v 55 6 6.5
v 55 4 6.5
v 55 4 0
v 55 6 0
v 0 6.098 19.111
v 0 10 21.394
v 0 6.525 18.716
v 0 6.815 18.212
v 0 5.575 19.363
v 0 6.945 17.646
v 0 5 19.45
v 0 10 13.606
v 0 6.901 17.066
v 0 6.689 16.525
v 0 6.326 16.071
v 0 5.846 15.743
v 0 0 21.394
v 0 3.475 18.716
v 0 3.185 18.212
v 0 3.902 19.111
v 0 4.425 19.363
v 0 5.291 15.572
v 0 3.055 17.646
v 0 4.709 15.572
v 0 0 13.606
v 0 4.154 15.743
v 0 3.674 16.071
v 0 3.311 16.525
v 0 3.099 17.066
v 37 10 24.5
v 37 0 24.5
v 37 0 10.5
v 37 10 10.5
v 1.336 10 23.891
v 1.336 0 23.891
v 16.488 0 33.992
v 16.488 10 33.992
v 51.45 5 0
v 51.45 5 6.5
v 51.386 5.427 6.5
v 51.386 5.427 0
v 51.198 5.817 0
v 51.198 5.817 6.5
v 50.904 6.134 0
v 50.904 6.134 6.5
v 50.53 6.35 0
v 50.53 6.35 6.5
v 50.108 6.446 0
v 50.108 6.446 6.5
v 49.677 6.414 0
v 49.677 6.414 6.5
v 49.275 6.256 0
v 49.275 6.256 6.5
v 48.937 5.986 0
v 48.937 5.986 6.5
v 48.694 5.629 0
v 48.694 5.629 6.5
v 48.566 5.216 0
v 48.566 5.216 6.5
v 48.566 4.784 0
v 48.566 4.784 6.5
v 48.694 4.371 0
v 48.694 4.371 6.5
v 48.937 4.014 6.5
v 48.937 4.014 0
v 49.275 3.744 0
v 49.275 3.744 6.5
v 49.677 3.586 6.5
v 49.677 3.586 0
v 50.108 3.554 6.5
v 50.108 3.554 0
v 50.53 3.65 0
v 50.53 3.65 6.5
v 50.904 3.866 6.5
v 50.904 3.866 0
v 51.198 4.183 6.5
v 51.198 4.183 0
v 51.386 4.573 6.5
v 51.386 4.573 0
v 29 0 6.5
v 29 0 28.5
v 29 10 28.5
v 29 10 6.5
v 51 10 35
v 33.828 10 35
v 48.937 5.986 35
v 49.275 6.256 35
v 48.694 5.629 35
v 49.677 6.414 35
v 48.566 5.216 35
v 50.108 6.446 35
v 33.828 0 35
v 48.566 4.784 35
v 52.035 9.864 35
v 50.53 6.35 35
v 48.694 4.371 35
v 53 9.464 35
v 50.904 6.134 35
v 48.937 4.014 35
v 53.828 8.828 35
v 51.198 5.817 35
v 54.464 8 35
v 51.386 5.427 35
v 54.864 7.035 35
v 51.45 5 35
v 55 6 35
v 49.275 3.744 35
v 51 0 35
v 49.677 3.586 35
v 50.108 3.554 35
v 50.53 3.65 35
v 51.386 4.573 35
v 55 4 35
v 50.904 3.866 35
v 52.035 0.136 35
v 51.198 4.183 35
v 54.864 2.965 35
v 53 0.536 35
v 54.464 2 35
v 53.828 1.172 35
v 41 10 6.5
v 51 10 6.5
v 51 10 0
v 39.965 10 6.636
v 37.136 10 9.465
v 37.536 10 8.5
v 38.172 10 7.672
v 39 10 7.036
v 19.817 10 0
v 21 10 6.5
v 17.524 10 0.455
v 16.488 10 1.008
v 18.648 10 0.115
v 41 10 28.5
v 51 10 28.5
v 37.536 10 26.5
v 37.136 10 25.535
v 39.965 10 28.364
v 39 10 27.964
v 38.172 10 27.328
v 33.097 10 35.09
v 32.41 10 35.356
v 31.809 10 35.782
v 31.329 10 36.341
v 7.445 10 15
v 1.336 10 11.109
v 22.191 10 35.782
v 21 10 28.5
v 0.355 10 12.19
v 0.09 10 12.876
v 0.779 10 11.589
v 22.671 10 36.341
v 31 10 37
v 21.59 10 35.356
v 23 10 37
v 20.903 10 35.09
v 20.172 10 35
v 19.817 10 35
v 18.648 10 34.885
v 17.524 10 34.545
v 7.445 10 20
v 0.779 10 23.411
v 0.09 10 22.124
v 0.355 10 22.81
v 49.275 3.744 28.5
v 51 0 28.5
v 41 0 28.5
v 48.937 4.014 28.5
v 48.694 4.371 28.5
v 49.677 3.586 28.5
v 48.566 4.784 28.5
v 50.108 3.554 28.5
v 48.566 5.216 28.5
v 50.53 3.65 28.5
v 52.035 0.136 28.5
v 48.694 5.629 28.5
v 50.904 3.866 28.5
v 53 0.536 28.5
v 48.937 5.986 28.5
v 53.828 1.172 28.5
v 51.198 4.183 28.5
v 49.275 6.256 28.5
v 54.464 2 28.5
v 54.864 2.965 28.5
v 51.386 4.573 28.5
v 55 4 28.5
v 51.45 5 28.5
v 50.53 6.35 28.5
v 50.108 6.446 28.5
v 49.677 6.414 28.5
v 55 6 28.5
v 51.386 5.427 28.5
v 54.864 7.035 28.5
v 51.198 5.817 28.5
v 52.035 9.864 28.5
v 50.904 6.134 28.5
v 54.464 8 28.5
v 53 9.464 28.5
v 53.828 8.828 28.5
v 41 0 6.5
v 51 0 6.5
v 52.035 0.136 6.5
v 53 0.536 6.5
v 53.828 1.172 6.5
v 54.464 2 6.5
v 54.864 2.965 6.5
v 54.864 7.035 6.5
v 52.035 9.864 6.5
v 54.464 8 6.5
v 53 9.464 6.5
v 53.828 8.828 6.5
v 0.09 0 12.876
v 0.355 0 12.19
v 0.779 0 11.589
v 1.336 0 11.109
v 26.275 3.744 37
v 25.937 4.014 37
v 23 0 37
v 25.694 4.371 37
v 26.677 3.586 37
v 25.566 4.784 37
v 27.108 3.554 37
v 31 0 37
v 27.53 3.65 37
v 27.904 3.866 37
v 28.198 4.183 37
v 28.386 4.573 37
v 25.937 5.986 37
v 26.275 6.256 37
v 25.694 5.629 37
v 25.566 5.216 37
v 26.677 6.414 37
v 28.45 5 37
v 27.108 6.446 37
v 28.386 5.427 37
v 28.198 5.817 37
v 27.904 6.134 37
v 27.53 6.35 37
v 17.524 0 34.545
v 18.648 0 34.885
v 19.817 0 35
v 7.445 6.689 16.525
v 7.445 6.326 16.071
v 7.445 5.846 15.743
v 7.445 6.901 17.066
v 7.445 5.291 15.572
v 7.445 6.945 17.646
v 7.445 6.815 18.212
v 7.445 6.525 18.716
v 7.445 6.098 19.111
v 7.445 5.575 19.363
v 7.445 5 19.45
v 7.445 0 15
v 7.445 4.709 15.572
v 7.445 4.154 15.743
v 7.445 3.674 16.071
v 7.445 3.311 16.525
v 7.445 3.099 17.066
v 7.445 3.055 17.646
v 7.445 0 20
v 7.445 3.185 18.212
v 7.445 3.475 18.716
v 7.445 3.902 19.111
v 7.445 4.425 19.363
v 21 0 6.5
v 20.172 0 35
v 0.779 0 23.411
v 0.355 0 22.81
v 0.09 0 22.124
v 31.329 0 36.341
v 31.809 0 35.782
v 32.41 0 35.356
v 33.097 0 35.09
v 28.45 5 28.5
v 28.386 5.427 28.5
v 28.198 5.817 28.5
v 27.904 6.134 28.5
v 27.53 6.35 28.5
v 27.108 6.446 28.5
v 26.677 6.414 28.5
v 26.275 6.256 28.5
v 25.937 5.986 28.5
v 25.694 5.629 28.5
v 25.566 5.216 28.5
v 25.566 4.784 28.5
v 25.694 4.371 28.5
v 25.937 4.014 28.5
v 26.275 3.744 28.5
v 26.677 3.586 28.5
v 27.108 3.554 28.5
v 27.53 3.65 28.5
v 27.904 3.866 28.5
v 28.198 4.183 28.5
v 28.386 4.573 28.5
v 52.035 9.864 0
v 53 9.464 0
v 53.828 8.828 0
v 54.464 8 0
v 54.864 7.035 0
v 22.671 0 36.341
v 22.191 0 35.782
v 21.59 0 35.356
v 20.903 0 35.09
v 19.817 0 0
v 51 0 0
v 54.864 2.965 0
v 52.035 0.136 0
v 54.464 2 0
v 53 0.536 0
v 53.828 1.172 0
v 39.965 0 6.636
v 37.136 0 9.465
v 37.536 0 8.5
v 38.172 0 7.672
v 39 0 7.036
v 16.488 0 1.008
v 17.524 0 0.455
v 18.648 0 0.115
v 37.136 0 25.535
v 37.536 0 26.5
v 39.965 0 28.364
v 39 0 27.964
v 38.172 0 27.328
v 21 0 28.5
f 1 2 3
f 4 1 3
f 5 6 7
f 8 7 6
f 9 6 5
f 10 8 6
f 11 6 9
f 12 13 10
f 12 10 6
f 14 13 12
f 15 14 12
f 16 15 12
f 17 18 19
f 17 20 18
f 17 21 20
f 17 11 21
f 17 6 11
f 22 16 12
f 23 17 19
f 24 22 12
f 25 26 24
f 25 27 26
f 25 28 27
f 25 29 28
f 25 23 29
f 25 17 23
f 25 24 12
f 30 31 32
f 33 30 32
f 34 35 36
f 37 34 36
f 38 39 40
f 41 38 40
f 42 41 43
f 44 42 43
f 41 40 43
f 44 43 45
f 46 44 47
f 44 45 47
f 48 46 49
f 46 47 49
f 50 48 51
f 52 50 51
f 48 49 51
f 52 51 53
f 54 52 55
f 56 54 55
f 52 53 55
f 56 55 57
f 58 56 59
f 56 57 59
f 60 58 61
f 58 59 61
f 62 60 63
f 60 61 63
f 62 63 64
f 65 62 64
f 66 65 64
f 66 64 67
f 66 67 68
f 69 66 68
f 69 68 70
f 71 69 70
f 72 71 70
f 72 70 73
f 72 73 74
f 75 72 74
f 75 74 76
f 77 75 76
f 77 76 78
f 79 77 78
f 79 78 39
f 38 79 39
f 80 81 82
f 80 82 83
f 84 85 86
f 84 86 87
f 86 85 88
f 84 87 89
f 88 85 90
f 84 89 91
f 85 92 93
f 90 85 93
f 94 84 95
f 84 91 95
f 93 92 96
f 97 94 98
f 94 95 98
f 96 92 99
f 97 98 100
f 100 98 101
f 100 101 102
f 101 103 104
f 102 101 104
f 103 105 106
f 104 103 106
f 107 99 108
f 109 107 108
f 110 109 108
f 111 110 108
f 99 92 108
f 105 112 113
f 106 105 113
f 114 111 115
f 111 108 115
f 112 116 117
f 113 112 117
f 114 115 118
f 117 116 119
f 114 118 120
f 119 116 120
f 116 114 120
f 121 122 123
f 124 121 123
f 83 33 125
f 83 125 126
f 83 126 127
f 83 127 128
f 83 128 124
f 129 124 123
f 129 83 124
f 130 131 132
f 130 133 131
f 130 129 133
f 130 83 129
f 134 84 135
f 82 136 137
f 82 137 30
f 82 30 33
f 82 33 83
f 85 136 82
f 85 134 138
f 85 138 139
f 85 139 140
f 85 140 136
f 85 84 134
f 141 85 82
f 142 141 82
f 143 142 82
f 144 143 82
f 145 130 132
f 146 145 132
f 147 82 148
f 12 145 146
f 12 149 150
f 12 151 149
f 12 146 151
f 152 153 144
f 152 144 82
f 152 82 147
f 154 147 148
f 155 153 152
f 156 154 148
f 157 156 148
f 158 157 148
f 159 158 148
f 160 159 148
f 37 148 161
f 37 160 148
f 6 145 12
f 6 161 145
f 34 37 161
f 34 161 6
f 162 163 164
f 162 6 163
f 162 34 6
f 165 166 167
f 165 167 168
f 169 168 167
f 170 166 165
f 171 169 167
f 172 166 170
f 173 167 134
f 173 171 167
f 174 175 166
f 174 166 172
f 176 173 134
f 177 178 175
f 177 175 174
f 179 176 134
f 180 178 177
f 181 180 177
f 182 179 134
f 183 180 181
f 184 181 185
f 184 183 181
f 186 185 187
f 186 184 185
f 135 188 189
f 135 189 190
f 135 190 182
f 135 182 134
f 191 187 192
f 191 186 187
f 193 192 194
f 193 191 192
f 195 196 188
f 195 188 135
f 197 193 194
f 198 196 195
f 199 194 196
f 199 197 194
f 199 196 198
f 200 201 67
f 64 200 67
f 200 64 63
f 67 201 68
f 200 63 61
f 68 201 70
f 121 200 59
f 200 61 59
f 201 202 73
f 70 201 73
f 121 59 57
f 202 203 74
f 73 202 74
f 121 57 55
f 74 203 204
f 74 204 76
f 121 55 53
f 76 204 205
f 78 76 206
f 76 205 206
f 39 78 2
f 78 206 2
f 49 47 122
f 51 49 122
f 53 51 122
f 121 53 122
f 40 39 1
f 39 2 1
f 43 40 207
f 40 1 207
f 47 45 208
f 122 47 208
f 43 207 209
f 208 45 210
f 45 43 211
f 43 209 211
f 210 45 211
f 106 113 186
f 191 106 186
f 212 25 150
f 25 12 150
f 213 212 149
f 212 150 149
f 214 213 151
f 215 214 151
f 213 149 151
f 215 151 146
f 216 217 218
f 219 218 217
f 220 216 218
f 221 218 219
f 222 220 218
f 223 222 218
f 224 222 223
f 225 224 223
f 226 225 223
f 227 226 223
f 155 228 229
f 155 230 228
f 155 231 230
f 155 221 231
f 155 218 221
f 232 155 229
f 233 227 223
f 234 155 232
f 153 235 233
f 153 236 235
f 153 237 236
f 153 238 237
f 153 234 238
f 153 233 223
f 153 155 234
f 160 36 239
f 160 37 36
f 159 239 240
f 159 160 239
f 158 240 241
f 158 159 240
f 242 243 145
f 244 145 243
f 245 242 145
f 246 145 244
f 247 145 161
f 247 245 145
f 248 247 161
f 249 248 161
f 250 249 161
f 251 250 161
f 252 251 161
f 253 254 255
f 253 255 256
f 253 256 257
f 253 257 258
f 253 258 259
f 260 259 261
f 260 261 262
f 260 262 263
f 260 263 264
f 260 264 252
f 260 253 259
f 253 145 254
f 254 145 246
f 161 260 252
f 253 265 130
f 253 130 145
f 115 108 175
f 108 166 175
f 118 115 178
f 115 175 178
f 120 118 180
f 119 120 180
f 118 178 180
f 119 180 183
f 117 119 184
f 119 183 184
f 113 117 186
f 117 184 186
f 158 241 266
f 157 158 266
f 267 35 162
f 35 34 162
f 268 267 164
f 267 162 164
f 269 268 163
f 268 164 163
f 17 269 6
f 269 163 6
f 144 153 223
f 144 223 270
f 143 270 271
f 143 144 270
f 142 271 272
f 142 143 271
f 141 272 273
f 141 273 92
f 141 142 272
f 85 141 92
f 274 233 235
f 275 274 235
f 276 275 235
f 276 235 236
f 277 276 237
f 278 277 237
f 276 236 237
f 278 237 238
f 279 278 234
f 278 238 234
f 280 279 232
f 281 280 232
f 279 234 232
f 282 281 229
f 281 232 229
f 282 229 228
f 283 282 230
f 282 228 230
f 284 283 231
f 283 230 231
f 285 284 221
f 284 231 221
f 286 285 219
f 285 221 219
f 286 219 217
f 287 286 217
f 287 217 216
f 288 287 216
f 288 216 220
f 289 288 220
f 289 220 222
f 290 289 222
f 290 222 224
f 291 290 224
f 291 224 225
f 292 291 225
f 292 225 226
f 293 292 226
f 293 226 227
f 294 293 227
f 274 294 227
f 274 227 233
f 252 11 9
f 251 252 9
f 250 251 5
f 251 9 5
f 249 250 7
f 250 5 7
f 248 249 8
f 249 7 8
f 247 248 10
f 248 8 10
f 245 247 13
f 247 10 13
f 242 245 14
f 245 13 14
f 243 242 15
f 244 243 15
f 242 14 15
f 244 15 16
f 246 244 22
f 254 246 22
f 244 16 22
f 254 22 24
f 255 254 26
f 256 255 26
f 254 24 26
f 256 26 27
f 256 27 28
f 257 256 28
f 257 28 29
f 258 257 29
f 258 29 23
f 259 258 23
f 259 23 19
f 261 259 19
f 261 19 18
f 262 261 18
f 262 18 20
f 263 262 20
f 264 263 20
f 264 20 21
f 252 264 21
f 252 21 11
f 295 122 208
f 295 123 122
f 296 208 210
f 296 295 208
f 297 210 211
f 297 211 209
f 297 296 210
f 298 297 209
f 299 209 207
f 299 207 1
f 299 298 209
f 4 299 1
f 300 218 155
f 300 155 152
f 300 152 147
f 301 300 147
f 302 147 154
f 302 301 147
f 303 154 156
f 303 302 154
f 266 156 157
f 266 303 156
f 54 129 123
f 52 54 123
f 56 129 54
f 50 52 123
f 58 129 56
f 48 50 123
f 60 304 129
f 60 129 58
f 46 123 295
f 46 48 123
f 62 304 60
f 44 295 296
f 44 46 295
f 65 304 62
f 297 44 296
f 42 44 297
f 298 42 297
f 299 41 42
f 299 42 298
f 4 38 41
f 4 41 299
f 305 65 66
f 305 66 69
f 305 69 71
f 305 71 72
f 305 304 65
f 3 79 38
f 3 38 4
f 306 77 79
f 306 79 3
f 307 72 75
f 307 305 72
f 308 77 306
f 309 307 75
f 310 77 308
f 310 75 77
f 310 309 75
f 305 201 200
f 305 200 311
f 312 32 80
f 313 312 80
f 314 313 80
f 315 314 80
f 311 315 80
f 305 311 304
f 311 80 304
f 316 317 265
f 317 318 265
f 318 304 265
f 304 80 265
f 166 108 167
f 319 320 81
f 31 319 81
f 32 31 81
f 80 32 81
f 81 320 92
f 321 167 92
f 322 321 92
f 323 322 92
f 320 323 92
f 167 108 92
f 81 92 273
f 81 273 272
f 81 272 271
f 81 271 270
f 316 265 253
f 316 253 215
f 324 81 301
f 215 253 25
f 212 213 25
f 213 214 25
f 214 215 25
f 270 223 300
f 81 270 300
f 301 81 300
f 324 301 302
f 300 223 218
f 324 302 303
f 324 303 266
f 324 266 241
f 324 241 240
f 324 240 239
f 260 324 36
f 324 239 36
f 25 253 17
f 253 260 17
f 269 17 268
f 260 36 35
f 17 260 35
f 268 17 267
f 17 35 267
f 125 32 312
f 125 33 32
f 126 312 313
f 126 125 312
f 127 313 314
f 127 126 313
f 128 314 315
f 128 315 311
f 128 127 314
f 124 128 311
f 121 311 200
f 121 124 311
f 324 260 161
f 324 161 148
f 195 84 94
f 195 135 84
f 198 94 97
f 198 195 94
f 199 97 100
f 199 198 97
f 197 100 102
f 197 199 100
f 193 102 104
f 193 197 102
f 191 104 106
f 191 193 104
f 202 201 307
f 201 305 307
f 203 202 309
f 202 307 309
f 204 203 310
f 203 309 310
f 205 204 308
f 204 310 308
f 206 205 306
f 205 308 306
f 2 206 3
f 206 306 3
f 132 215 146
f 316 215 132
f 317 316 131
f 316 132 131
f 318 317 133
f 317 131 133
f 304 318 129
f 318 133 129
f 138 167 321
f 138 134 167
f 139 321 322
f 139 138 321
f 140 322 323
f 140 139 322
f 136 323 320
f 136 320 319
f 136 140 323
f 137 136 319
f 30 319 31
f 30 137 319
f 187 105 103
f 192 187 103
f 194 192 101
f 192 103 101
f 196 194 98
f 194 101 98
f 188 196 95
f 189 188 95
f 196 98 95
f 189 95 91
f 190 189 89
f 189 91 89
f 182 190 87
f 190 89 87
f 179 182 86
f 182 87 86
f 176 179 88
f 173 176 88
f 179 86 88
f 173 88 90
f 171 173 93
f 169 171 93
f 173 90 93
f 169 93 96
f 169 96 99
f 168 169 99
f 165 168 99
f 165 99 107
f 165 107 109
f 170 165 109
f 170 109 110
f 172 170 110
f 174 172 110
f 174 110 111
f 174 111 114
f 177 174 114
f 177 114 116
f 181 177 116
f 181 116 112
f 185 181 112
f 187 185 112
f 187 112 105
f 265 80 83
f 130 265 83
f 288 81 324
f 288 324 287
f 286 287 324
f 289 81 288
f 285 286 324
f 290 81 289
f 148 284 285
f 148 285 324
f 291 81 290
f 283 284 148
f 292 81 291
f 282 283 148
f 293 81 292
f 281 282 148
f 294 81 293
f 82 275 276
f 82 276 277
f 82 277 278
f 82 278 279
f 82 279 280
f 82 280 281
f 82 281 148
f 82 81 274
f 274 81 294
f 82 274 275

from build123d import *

# Parameters (mm, degrees)
SKETCH1_W           = 55
SKETCH1_H           = 35
BOSS_EXTRUDE1_DEPTH = 10
SKETCH2_W           = 22
SKETCH2_H           = 10
CUT_EXTRUDE1_DEPTH  = 34
CUT_EXTRUDE6_DEPTH  = 66.954529791
CUT_EXTRUDE7_DEPTH  = 66.954529791
SKETCH11_W          = 8
SKETCH11_H          = 22
BOSS_EXTRUDE3_DEPTH = 10
SKETCH12_R          = 1.45
CUT_EXTRUDE8_DEPTH  = 66.954529791
SKETCH13_R          = 1.95
CUT_EXTRUDE9_DEPTH  = 11
FILLET4_R           = 4
FILLET5_R           = 3
FILLET6_R           = 6
FILLET7_R           = 4
SKETCH14_W          = 8
SKETCH14_H          = 10
BOSS_EXTRUDE4_DEPTH = 2
SKETCH15_R          = 1.45
CUT_EXTRUDE10_DEPTH = 12
FILLET8_R           = 3


with BuildPart() as part:
    # Sketch1 → Boss-Extrude1 (new body)
    with BuildSketch(Plane(origin=(0, 0, 0), x_dir=(1, 0, 0), z_dir=(0, 1, 0))):
        with Locations((27.5, -17.5)):
            Rectangle(SKETCH1_W, SKETCH1_H)
    extrude(amount=BOSS_EXTRUDE1_DEPTH)

    # Sketch2 → Cut-Extrude1 (cut)
    with BuildSketch(Plane(origin=(55, 0, 0), x_dir=(0, 0, -1), z_dir=(1, 0, 0))):
        with Locations((-17.5, 5)):
            Rectangle(SKETCH2_W, SKETCH2_H)
    extrude(amount=-CUT_EXTRUDE1_DEPTH, mode=Mode.SUBTRACT)

    # Sketch9 → Cut-Extrude6 (cut, through all)
    with BuildSketch(Plane(origin=(0, 0, 0), x_dir=(-1, 0, 0), z_dir=(0, -1, 0))):
        Polygon((0, -12), (-18, 0), (0, 0), align=None)
        Polygon((0, -23), (-18, -35), (0, -35), align=None)
    extrude(amount=-CUT_EXTRUDE6_DEPTH, mode=Mode.SUBTRACT)

    # Sketch10 → Cut-Extrude7 (cut, through all)
    with BuildSketch(Plane(origin=(0, 0, 0), x_dir=(-1, 0, 0), z_dir=(0, -1, 0))):
        Polygon((-21, -6.5), (-7.444558288, -15), (-7.444558288, -20), (-21, -28.5), align=None)
    extrude(amount=-CUT_EXTRUDE7_DEPTH, mode=Mode.SUBTRACT)

    # Sketch11 → Boss-Extrude3 (add)
    with BuildSketch(Plane(origin=(0, 0, 0), x_dir=(-1, 0, 0), z_dir=(0, -1, 0))):
        with Locations((-33, -17.5)):
            Rectangle(SKETCH11_W, SKETCH11_H)
    extrude(amount=-BOSS_EXTRUDE3_DEPTH)

    # Sketch12 → Cut-Extrude8 (cut, through all)
    with BuildSketch(Plane.XY.offset(35)):
        with Locations((50, 5)):
            Circle(SKETCH12_R)
    extrude(amount=-CUT_EXTRUDE8_DEPTH, mode=Mode.SUBTRACT)

    # Sketch13 → Cut-Extrude9 (cut)
    with BuildSketch(Plane.ZY):
        with Locations((17.5, 5)):
            Circle(SKETCH13_R)
    extrude(amount=-CUT_EXTRUDE9_DEPTH, mode=Mode.SUBTRACT)

    # Fillet4
    fillet4_edges = [part.edges().sort_by_distance(p)[0] for p in [
        (55, 10, 31.75),
        (55, 0, 3.25),
        (55, 10, 3.25),
        (55, 0, 31.75),
    ]]
    fillet(fillet4_edges, radius=FILLET4_R)

    # Fillet5
    fillet5_edges = [part.edges().sort_by_distance(p)[0] for p in [
        (0, 5, 12),
        (0, 5, 23),
    ]]
    fillet(fillet5_edges, radius=FILLET5_R)

    # Fillet6
    fillet6_edges = [part.edges().sort_by_distance(p)[0] for p in [
        (18, 5, 0),
        (18, 5, 35),
    ]]
    fillet(fillet6_edges, radius=FILLET6_R)

    # Fillet7
    fillet7_edges = [part.edges().sort_by_distance(p)[0] for p in [
        (37, 5, 28.5),
        (37, 5, 6.5),
    ]]
    fillet(fillet7_edges, radius=FILLET7_R)

    # Sketch14 → Boss-Extrude4 (add)
    with BuildSketch(Plane.XY.offset(35)):
        with Locations((27, 5)):
            Rectangle(SKETCH14_W, SKETCH14_H)
    extrude(amount=BOSS_EXTRUDE4_DEPTH)

    # Sketch15 → Cut-Extrude10 (cut)
    with BuildSketch(Plane.XY.offset(37)):
        with Locations((27, 5)):
            Circle(SKETCH15_R)
    extrude(amount=-CUT_EXTRUDE10_DEPTH, mode=Mode.SUBTRACT)

    # Fillet8
    # the kernel refuses this fillet: 3 mm, written as the material it adds along each edge
    with BuildSketch(Plane(origin=(23, 0, 35), x_dir=(0, 0, 1), z_dir=(0, 1, 0))) as fillet8_piece_1:
        with BuildLine():
            CenterArc((3, -2.828427125), FILLET8_R, 109.471220634, 70.528779366)
            Line((0, -2.828427125), (-0.06, -2.828427125))
            Line((-0.06, -2.828427125), (-0.06, 0))
            Line((-0.06, 0), (0, 0.06))
            ThreePointArc((0, 0.06), (1, 0.06), (1.98, 0.056568542))
            Line((1.98, 0.056568542), (2, 0))
        make_face()
    extrude(amount=10)
    with BuildSketch(Plane(origin=(31, 10, 35), x_dir=(1, 0, 0), z_dir=(0, -1, 0))) as fillet8_piece_2:
        with BuildLine():
            CenterArc((2.828427125, 3), FILLET8_R, 199.471220634, 70.528779366)
            Line((0, 2), (-0.056568542, 1.98))
            ThreePointArc((-0.056568542, 1.98), (-0.06, 1), (-0.06, 0))
            Line((-0.06, 0), (0, -0.06))
            Line((0, -0.06), (2.828427125, -0.06))
            Line((2.828427125, -0.06), (2.828427125, 0))
        make_face()
    extrude(amount=10)


solid = part.part
